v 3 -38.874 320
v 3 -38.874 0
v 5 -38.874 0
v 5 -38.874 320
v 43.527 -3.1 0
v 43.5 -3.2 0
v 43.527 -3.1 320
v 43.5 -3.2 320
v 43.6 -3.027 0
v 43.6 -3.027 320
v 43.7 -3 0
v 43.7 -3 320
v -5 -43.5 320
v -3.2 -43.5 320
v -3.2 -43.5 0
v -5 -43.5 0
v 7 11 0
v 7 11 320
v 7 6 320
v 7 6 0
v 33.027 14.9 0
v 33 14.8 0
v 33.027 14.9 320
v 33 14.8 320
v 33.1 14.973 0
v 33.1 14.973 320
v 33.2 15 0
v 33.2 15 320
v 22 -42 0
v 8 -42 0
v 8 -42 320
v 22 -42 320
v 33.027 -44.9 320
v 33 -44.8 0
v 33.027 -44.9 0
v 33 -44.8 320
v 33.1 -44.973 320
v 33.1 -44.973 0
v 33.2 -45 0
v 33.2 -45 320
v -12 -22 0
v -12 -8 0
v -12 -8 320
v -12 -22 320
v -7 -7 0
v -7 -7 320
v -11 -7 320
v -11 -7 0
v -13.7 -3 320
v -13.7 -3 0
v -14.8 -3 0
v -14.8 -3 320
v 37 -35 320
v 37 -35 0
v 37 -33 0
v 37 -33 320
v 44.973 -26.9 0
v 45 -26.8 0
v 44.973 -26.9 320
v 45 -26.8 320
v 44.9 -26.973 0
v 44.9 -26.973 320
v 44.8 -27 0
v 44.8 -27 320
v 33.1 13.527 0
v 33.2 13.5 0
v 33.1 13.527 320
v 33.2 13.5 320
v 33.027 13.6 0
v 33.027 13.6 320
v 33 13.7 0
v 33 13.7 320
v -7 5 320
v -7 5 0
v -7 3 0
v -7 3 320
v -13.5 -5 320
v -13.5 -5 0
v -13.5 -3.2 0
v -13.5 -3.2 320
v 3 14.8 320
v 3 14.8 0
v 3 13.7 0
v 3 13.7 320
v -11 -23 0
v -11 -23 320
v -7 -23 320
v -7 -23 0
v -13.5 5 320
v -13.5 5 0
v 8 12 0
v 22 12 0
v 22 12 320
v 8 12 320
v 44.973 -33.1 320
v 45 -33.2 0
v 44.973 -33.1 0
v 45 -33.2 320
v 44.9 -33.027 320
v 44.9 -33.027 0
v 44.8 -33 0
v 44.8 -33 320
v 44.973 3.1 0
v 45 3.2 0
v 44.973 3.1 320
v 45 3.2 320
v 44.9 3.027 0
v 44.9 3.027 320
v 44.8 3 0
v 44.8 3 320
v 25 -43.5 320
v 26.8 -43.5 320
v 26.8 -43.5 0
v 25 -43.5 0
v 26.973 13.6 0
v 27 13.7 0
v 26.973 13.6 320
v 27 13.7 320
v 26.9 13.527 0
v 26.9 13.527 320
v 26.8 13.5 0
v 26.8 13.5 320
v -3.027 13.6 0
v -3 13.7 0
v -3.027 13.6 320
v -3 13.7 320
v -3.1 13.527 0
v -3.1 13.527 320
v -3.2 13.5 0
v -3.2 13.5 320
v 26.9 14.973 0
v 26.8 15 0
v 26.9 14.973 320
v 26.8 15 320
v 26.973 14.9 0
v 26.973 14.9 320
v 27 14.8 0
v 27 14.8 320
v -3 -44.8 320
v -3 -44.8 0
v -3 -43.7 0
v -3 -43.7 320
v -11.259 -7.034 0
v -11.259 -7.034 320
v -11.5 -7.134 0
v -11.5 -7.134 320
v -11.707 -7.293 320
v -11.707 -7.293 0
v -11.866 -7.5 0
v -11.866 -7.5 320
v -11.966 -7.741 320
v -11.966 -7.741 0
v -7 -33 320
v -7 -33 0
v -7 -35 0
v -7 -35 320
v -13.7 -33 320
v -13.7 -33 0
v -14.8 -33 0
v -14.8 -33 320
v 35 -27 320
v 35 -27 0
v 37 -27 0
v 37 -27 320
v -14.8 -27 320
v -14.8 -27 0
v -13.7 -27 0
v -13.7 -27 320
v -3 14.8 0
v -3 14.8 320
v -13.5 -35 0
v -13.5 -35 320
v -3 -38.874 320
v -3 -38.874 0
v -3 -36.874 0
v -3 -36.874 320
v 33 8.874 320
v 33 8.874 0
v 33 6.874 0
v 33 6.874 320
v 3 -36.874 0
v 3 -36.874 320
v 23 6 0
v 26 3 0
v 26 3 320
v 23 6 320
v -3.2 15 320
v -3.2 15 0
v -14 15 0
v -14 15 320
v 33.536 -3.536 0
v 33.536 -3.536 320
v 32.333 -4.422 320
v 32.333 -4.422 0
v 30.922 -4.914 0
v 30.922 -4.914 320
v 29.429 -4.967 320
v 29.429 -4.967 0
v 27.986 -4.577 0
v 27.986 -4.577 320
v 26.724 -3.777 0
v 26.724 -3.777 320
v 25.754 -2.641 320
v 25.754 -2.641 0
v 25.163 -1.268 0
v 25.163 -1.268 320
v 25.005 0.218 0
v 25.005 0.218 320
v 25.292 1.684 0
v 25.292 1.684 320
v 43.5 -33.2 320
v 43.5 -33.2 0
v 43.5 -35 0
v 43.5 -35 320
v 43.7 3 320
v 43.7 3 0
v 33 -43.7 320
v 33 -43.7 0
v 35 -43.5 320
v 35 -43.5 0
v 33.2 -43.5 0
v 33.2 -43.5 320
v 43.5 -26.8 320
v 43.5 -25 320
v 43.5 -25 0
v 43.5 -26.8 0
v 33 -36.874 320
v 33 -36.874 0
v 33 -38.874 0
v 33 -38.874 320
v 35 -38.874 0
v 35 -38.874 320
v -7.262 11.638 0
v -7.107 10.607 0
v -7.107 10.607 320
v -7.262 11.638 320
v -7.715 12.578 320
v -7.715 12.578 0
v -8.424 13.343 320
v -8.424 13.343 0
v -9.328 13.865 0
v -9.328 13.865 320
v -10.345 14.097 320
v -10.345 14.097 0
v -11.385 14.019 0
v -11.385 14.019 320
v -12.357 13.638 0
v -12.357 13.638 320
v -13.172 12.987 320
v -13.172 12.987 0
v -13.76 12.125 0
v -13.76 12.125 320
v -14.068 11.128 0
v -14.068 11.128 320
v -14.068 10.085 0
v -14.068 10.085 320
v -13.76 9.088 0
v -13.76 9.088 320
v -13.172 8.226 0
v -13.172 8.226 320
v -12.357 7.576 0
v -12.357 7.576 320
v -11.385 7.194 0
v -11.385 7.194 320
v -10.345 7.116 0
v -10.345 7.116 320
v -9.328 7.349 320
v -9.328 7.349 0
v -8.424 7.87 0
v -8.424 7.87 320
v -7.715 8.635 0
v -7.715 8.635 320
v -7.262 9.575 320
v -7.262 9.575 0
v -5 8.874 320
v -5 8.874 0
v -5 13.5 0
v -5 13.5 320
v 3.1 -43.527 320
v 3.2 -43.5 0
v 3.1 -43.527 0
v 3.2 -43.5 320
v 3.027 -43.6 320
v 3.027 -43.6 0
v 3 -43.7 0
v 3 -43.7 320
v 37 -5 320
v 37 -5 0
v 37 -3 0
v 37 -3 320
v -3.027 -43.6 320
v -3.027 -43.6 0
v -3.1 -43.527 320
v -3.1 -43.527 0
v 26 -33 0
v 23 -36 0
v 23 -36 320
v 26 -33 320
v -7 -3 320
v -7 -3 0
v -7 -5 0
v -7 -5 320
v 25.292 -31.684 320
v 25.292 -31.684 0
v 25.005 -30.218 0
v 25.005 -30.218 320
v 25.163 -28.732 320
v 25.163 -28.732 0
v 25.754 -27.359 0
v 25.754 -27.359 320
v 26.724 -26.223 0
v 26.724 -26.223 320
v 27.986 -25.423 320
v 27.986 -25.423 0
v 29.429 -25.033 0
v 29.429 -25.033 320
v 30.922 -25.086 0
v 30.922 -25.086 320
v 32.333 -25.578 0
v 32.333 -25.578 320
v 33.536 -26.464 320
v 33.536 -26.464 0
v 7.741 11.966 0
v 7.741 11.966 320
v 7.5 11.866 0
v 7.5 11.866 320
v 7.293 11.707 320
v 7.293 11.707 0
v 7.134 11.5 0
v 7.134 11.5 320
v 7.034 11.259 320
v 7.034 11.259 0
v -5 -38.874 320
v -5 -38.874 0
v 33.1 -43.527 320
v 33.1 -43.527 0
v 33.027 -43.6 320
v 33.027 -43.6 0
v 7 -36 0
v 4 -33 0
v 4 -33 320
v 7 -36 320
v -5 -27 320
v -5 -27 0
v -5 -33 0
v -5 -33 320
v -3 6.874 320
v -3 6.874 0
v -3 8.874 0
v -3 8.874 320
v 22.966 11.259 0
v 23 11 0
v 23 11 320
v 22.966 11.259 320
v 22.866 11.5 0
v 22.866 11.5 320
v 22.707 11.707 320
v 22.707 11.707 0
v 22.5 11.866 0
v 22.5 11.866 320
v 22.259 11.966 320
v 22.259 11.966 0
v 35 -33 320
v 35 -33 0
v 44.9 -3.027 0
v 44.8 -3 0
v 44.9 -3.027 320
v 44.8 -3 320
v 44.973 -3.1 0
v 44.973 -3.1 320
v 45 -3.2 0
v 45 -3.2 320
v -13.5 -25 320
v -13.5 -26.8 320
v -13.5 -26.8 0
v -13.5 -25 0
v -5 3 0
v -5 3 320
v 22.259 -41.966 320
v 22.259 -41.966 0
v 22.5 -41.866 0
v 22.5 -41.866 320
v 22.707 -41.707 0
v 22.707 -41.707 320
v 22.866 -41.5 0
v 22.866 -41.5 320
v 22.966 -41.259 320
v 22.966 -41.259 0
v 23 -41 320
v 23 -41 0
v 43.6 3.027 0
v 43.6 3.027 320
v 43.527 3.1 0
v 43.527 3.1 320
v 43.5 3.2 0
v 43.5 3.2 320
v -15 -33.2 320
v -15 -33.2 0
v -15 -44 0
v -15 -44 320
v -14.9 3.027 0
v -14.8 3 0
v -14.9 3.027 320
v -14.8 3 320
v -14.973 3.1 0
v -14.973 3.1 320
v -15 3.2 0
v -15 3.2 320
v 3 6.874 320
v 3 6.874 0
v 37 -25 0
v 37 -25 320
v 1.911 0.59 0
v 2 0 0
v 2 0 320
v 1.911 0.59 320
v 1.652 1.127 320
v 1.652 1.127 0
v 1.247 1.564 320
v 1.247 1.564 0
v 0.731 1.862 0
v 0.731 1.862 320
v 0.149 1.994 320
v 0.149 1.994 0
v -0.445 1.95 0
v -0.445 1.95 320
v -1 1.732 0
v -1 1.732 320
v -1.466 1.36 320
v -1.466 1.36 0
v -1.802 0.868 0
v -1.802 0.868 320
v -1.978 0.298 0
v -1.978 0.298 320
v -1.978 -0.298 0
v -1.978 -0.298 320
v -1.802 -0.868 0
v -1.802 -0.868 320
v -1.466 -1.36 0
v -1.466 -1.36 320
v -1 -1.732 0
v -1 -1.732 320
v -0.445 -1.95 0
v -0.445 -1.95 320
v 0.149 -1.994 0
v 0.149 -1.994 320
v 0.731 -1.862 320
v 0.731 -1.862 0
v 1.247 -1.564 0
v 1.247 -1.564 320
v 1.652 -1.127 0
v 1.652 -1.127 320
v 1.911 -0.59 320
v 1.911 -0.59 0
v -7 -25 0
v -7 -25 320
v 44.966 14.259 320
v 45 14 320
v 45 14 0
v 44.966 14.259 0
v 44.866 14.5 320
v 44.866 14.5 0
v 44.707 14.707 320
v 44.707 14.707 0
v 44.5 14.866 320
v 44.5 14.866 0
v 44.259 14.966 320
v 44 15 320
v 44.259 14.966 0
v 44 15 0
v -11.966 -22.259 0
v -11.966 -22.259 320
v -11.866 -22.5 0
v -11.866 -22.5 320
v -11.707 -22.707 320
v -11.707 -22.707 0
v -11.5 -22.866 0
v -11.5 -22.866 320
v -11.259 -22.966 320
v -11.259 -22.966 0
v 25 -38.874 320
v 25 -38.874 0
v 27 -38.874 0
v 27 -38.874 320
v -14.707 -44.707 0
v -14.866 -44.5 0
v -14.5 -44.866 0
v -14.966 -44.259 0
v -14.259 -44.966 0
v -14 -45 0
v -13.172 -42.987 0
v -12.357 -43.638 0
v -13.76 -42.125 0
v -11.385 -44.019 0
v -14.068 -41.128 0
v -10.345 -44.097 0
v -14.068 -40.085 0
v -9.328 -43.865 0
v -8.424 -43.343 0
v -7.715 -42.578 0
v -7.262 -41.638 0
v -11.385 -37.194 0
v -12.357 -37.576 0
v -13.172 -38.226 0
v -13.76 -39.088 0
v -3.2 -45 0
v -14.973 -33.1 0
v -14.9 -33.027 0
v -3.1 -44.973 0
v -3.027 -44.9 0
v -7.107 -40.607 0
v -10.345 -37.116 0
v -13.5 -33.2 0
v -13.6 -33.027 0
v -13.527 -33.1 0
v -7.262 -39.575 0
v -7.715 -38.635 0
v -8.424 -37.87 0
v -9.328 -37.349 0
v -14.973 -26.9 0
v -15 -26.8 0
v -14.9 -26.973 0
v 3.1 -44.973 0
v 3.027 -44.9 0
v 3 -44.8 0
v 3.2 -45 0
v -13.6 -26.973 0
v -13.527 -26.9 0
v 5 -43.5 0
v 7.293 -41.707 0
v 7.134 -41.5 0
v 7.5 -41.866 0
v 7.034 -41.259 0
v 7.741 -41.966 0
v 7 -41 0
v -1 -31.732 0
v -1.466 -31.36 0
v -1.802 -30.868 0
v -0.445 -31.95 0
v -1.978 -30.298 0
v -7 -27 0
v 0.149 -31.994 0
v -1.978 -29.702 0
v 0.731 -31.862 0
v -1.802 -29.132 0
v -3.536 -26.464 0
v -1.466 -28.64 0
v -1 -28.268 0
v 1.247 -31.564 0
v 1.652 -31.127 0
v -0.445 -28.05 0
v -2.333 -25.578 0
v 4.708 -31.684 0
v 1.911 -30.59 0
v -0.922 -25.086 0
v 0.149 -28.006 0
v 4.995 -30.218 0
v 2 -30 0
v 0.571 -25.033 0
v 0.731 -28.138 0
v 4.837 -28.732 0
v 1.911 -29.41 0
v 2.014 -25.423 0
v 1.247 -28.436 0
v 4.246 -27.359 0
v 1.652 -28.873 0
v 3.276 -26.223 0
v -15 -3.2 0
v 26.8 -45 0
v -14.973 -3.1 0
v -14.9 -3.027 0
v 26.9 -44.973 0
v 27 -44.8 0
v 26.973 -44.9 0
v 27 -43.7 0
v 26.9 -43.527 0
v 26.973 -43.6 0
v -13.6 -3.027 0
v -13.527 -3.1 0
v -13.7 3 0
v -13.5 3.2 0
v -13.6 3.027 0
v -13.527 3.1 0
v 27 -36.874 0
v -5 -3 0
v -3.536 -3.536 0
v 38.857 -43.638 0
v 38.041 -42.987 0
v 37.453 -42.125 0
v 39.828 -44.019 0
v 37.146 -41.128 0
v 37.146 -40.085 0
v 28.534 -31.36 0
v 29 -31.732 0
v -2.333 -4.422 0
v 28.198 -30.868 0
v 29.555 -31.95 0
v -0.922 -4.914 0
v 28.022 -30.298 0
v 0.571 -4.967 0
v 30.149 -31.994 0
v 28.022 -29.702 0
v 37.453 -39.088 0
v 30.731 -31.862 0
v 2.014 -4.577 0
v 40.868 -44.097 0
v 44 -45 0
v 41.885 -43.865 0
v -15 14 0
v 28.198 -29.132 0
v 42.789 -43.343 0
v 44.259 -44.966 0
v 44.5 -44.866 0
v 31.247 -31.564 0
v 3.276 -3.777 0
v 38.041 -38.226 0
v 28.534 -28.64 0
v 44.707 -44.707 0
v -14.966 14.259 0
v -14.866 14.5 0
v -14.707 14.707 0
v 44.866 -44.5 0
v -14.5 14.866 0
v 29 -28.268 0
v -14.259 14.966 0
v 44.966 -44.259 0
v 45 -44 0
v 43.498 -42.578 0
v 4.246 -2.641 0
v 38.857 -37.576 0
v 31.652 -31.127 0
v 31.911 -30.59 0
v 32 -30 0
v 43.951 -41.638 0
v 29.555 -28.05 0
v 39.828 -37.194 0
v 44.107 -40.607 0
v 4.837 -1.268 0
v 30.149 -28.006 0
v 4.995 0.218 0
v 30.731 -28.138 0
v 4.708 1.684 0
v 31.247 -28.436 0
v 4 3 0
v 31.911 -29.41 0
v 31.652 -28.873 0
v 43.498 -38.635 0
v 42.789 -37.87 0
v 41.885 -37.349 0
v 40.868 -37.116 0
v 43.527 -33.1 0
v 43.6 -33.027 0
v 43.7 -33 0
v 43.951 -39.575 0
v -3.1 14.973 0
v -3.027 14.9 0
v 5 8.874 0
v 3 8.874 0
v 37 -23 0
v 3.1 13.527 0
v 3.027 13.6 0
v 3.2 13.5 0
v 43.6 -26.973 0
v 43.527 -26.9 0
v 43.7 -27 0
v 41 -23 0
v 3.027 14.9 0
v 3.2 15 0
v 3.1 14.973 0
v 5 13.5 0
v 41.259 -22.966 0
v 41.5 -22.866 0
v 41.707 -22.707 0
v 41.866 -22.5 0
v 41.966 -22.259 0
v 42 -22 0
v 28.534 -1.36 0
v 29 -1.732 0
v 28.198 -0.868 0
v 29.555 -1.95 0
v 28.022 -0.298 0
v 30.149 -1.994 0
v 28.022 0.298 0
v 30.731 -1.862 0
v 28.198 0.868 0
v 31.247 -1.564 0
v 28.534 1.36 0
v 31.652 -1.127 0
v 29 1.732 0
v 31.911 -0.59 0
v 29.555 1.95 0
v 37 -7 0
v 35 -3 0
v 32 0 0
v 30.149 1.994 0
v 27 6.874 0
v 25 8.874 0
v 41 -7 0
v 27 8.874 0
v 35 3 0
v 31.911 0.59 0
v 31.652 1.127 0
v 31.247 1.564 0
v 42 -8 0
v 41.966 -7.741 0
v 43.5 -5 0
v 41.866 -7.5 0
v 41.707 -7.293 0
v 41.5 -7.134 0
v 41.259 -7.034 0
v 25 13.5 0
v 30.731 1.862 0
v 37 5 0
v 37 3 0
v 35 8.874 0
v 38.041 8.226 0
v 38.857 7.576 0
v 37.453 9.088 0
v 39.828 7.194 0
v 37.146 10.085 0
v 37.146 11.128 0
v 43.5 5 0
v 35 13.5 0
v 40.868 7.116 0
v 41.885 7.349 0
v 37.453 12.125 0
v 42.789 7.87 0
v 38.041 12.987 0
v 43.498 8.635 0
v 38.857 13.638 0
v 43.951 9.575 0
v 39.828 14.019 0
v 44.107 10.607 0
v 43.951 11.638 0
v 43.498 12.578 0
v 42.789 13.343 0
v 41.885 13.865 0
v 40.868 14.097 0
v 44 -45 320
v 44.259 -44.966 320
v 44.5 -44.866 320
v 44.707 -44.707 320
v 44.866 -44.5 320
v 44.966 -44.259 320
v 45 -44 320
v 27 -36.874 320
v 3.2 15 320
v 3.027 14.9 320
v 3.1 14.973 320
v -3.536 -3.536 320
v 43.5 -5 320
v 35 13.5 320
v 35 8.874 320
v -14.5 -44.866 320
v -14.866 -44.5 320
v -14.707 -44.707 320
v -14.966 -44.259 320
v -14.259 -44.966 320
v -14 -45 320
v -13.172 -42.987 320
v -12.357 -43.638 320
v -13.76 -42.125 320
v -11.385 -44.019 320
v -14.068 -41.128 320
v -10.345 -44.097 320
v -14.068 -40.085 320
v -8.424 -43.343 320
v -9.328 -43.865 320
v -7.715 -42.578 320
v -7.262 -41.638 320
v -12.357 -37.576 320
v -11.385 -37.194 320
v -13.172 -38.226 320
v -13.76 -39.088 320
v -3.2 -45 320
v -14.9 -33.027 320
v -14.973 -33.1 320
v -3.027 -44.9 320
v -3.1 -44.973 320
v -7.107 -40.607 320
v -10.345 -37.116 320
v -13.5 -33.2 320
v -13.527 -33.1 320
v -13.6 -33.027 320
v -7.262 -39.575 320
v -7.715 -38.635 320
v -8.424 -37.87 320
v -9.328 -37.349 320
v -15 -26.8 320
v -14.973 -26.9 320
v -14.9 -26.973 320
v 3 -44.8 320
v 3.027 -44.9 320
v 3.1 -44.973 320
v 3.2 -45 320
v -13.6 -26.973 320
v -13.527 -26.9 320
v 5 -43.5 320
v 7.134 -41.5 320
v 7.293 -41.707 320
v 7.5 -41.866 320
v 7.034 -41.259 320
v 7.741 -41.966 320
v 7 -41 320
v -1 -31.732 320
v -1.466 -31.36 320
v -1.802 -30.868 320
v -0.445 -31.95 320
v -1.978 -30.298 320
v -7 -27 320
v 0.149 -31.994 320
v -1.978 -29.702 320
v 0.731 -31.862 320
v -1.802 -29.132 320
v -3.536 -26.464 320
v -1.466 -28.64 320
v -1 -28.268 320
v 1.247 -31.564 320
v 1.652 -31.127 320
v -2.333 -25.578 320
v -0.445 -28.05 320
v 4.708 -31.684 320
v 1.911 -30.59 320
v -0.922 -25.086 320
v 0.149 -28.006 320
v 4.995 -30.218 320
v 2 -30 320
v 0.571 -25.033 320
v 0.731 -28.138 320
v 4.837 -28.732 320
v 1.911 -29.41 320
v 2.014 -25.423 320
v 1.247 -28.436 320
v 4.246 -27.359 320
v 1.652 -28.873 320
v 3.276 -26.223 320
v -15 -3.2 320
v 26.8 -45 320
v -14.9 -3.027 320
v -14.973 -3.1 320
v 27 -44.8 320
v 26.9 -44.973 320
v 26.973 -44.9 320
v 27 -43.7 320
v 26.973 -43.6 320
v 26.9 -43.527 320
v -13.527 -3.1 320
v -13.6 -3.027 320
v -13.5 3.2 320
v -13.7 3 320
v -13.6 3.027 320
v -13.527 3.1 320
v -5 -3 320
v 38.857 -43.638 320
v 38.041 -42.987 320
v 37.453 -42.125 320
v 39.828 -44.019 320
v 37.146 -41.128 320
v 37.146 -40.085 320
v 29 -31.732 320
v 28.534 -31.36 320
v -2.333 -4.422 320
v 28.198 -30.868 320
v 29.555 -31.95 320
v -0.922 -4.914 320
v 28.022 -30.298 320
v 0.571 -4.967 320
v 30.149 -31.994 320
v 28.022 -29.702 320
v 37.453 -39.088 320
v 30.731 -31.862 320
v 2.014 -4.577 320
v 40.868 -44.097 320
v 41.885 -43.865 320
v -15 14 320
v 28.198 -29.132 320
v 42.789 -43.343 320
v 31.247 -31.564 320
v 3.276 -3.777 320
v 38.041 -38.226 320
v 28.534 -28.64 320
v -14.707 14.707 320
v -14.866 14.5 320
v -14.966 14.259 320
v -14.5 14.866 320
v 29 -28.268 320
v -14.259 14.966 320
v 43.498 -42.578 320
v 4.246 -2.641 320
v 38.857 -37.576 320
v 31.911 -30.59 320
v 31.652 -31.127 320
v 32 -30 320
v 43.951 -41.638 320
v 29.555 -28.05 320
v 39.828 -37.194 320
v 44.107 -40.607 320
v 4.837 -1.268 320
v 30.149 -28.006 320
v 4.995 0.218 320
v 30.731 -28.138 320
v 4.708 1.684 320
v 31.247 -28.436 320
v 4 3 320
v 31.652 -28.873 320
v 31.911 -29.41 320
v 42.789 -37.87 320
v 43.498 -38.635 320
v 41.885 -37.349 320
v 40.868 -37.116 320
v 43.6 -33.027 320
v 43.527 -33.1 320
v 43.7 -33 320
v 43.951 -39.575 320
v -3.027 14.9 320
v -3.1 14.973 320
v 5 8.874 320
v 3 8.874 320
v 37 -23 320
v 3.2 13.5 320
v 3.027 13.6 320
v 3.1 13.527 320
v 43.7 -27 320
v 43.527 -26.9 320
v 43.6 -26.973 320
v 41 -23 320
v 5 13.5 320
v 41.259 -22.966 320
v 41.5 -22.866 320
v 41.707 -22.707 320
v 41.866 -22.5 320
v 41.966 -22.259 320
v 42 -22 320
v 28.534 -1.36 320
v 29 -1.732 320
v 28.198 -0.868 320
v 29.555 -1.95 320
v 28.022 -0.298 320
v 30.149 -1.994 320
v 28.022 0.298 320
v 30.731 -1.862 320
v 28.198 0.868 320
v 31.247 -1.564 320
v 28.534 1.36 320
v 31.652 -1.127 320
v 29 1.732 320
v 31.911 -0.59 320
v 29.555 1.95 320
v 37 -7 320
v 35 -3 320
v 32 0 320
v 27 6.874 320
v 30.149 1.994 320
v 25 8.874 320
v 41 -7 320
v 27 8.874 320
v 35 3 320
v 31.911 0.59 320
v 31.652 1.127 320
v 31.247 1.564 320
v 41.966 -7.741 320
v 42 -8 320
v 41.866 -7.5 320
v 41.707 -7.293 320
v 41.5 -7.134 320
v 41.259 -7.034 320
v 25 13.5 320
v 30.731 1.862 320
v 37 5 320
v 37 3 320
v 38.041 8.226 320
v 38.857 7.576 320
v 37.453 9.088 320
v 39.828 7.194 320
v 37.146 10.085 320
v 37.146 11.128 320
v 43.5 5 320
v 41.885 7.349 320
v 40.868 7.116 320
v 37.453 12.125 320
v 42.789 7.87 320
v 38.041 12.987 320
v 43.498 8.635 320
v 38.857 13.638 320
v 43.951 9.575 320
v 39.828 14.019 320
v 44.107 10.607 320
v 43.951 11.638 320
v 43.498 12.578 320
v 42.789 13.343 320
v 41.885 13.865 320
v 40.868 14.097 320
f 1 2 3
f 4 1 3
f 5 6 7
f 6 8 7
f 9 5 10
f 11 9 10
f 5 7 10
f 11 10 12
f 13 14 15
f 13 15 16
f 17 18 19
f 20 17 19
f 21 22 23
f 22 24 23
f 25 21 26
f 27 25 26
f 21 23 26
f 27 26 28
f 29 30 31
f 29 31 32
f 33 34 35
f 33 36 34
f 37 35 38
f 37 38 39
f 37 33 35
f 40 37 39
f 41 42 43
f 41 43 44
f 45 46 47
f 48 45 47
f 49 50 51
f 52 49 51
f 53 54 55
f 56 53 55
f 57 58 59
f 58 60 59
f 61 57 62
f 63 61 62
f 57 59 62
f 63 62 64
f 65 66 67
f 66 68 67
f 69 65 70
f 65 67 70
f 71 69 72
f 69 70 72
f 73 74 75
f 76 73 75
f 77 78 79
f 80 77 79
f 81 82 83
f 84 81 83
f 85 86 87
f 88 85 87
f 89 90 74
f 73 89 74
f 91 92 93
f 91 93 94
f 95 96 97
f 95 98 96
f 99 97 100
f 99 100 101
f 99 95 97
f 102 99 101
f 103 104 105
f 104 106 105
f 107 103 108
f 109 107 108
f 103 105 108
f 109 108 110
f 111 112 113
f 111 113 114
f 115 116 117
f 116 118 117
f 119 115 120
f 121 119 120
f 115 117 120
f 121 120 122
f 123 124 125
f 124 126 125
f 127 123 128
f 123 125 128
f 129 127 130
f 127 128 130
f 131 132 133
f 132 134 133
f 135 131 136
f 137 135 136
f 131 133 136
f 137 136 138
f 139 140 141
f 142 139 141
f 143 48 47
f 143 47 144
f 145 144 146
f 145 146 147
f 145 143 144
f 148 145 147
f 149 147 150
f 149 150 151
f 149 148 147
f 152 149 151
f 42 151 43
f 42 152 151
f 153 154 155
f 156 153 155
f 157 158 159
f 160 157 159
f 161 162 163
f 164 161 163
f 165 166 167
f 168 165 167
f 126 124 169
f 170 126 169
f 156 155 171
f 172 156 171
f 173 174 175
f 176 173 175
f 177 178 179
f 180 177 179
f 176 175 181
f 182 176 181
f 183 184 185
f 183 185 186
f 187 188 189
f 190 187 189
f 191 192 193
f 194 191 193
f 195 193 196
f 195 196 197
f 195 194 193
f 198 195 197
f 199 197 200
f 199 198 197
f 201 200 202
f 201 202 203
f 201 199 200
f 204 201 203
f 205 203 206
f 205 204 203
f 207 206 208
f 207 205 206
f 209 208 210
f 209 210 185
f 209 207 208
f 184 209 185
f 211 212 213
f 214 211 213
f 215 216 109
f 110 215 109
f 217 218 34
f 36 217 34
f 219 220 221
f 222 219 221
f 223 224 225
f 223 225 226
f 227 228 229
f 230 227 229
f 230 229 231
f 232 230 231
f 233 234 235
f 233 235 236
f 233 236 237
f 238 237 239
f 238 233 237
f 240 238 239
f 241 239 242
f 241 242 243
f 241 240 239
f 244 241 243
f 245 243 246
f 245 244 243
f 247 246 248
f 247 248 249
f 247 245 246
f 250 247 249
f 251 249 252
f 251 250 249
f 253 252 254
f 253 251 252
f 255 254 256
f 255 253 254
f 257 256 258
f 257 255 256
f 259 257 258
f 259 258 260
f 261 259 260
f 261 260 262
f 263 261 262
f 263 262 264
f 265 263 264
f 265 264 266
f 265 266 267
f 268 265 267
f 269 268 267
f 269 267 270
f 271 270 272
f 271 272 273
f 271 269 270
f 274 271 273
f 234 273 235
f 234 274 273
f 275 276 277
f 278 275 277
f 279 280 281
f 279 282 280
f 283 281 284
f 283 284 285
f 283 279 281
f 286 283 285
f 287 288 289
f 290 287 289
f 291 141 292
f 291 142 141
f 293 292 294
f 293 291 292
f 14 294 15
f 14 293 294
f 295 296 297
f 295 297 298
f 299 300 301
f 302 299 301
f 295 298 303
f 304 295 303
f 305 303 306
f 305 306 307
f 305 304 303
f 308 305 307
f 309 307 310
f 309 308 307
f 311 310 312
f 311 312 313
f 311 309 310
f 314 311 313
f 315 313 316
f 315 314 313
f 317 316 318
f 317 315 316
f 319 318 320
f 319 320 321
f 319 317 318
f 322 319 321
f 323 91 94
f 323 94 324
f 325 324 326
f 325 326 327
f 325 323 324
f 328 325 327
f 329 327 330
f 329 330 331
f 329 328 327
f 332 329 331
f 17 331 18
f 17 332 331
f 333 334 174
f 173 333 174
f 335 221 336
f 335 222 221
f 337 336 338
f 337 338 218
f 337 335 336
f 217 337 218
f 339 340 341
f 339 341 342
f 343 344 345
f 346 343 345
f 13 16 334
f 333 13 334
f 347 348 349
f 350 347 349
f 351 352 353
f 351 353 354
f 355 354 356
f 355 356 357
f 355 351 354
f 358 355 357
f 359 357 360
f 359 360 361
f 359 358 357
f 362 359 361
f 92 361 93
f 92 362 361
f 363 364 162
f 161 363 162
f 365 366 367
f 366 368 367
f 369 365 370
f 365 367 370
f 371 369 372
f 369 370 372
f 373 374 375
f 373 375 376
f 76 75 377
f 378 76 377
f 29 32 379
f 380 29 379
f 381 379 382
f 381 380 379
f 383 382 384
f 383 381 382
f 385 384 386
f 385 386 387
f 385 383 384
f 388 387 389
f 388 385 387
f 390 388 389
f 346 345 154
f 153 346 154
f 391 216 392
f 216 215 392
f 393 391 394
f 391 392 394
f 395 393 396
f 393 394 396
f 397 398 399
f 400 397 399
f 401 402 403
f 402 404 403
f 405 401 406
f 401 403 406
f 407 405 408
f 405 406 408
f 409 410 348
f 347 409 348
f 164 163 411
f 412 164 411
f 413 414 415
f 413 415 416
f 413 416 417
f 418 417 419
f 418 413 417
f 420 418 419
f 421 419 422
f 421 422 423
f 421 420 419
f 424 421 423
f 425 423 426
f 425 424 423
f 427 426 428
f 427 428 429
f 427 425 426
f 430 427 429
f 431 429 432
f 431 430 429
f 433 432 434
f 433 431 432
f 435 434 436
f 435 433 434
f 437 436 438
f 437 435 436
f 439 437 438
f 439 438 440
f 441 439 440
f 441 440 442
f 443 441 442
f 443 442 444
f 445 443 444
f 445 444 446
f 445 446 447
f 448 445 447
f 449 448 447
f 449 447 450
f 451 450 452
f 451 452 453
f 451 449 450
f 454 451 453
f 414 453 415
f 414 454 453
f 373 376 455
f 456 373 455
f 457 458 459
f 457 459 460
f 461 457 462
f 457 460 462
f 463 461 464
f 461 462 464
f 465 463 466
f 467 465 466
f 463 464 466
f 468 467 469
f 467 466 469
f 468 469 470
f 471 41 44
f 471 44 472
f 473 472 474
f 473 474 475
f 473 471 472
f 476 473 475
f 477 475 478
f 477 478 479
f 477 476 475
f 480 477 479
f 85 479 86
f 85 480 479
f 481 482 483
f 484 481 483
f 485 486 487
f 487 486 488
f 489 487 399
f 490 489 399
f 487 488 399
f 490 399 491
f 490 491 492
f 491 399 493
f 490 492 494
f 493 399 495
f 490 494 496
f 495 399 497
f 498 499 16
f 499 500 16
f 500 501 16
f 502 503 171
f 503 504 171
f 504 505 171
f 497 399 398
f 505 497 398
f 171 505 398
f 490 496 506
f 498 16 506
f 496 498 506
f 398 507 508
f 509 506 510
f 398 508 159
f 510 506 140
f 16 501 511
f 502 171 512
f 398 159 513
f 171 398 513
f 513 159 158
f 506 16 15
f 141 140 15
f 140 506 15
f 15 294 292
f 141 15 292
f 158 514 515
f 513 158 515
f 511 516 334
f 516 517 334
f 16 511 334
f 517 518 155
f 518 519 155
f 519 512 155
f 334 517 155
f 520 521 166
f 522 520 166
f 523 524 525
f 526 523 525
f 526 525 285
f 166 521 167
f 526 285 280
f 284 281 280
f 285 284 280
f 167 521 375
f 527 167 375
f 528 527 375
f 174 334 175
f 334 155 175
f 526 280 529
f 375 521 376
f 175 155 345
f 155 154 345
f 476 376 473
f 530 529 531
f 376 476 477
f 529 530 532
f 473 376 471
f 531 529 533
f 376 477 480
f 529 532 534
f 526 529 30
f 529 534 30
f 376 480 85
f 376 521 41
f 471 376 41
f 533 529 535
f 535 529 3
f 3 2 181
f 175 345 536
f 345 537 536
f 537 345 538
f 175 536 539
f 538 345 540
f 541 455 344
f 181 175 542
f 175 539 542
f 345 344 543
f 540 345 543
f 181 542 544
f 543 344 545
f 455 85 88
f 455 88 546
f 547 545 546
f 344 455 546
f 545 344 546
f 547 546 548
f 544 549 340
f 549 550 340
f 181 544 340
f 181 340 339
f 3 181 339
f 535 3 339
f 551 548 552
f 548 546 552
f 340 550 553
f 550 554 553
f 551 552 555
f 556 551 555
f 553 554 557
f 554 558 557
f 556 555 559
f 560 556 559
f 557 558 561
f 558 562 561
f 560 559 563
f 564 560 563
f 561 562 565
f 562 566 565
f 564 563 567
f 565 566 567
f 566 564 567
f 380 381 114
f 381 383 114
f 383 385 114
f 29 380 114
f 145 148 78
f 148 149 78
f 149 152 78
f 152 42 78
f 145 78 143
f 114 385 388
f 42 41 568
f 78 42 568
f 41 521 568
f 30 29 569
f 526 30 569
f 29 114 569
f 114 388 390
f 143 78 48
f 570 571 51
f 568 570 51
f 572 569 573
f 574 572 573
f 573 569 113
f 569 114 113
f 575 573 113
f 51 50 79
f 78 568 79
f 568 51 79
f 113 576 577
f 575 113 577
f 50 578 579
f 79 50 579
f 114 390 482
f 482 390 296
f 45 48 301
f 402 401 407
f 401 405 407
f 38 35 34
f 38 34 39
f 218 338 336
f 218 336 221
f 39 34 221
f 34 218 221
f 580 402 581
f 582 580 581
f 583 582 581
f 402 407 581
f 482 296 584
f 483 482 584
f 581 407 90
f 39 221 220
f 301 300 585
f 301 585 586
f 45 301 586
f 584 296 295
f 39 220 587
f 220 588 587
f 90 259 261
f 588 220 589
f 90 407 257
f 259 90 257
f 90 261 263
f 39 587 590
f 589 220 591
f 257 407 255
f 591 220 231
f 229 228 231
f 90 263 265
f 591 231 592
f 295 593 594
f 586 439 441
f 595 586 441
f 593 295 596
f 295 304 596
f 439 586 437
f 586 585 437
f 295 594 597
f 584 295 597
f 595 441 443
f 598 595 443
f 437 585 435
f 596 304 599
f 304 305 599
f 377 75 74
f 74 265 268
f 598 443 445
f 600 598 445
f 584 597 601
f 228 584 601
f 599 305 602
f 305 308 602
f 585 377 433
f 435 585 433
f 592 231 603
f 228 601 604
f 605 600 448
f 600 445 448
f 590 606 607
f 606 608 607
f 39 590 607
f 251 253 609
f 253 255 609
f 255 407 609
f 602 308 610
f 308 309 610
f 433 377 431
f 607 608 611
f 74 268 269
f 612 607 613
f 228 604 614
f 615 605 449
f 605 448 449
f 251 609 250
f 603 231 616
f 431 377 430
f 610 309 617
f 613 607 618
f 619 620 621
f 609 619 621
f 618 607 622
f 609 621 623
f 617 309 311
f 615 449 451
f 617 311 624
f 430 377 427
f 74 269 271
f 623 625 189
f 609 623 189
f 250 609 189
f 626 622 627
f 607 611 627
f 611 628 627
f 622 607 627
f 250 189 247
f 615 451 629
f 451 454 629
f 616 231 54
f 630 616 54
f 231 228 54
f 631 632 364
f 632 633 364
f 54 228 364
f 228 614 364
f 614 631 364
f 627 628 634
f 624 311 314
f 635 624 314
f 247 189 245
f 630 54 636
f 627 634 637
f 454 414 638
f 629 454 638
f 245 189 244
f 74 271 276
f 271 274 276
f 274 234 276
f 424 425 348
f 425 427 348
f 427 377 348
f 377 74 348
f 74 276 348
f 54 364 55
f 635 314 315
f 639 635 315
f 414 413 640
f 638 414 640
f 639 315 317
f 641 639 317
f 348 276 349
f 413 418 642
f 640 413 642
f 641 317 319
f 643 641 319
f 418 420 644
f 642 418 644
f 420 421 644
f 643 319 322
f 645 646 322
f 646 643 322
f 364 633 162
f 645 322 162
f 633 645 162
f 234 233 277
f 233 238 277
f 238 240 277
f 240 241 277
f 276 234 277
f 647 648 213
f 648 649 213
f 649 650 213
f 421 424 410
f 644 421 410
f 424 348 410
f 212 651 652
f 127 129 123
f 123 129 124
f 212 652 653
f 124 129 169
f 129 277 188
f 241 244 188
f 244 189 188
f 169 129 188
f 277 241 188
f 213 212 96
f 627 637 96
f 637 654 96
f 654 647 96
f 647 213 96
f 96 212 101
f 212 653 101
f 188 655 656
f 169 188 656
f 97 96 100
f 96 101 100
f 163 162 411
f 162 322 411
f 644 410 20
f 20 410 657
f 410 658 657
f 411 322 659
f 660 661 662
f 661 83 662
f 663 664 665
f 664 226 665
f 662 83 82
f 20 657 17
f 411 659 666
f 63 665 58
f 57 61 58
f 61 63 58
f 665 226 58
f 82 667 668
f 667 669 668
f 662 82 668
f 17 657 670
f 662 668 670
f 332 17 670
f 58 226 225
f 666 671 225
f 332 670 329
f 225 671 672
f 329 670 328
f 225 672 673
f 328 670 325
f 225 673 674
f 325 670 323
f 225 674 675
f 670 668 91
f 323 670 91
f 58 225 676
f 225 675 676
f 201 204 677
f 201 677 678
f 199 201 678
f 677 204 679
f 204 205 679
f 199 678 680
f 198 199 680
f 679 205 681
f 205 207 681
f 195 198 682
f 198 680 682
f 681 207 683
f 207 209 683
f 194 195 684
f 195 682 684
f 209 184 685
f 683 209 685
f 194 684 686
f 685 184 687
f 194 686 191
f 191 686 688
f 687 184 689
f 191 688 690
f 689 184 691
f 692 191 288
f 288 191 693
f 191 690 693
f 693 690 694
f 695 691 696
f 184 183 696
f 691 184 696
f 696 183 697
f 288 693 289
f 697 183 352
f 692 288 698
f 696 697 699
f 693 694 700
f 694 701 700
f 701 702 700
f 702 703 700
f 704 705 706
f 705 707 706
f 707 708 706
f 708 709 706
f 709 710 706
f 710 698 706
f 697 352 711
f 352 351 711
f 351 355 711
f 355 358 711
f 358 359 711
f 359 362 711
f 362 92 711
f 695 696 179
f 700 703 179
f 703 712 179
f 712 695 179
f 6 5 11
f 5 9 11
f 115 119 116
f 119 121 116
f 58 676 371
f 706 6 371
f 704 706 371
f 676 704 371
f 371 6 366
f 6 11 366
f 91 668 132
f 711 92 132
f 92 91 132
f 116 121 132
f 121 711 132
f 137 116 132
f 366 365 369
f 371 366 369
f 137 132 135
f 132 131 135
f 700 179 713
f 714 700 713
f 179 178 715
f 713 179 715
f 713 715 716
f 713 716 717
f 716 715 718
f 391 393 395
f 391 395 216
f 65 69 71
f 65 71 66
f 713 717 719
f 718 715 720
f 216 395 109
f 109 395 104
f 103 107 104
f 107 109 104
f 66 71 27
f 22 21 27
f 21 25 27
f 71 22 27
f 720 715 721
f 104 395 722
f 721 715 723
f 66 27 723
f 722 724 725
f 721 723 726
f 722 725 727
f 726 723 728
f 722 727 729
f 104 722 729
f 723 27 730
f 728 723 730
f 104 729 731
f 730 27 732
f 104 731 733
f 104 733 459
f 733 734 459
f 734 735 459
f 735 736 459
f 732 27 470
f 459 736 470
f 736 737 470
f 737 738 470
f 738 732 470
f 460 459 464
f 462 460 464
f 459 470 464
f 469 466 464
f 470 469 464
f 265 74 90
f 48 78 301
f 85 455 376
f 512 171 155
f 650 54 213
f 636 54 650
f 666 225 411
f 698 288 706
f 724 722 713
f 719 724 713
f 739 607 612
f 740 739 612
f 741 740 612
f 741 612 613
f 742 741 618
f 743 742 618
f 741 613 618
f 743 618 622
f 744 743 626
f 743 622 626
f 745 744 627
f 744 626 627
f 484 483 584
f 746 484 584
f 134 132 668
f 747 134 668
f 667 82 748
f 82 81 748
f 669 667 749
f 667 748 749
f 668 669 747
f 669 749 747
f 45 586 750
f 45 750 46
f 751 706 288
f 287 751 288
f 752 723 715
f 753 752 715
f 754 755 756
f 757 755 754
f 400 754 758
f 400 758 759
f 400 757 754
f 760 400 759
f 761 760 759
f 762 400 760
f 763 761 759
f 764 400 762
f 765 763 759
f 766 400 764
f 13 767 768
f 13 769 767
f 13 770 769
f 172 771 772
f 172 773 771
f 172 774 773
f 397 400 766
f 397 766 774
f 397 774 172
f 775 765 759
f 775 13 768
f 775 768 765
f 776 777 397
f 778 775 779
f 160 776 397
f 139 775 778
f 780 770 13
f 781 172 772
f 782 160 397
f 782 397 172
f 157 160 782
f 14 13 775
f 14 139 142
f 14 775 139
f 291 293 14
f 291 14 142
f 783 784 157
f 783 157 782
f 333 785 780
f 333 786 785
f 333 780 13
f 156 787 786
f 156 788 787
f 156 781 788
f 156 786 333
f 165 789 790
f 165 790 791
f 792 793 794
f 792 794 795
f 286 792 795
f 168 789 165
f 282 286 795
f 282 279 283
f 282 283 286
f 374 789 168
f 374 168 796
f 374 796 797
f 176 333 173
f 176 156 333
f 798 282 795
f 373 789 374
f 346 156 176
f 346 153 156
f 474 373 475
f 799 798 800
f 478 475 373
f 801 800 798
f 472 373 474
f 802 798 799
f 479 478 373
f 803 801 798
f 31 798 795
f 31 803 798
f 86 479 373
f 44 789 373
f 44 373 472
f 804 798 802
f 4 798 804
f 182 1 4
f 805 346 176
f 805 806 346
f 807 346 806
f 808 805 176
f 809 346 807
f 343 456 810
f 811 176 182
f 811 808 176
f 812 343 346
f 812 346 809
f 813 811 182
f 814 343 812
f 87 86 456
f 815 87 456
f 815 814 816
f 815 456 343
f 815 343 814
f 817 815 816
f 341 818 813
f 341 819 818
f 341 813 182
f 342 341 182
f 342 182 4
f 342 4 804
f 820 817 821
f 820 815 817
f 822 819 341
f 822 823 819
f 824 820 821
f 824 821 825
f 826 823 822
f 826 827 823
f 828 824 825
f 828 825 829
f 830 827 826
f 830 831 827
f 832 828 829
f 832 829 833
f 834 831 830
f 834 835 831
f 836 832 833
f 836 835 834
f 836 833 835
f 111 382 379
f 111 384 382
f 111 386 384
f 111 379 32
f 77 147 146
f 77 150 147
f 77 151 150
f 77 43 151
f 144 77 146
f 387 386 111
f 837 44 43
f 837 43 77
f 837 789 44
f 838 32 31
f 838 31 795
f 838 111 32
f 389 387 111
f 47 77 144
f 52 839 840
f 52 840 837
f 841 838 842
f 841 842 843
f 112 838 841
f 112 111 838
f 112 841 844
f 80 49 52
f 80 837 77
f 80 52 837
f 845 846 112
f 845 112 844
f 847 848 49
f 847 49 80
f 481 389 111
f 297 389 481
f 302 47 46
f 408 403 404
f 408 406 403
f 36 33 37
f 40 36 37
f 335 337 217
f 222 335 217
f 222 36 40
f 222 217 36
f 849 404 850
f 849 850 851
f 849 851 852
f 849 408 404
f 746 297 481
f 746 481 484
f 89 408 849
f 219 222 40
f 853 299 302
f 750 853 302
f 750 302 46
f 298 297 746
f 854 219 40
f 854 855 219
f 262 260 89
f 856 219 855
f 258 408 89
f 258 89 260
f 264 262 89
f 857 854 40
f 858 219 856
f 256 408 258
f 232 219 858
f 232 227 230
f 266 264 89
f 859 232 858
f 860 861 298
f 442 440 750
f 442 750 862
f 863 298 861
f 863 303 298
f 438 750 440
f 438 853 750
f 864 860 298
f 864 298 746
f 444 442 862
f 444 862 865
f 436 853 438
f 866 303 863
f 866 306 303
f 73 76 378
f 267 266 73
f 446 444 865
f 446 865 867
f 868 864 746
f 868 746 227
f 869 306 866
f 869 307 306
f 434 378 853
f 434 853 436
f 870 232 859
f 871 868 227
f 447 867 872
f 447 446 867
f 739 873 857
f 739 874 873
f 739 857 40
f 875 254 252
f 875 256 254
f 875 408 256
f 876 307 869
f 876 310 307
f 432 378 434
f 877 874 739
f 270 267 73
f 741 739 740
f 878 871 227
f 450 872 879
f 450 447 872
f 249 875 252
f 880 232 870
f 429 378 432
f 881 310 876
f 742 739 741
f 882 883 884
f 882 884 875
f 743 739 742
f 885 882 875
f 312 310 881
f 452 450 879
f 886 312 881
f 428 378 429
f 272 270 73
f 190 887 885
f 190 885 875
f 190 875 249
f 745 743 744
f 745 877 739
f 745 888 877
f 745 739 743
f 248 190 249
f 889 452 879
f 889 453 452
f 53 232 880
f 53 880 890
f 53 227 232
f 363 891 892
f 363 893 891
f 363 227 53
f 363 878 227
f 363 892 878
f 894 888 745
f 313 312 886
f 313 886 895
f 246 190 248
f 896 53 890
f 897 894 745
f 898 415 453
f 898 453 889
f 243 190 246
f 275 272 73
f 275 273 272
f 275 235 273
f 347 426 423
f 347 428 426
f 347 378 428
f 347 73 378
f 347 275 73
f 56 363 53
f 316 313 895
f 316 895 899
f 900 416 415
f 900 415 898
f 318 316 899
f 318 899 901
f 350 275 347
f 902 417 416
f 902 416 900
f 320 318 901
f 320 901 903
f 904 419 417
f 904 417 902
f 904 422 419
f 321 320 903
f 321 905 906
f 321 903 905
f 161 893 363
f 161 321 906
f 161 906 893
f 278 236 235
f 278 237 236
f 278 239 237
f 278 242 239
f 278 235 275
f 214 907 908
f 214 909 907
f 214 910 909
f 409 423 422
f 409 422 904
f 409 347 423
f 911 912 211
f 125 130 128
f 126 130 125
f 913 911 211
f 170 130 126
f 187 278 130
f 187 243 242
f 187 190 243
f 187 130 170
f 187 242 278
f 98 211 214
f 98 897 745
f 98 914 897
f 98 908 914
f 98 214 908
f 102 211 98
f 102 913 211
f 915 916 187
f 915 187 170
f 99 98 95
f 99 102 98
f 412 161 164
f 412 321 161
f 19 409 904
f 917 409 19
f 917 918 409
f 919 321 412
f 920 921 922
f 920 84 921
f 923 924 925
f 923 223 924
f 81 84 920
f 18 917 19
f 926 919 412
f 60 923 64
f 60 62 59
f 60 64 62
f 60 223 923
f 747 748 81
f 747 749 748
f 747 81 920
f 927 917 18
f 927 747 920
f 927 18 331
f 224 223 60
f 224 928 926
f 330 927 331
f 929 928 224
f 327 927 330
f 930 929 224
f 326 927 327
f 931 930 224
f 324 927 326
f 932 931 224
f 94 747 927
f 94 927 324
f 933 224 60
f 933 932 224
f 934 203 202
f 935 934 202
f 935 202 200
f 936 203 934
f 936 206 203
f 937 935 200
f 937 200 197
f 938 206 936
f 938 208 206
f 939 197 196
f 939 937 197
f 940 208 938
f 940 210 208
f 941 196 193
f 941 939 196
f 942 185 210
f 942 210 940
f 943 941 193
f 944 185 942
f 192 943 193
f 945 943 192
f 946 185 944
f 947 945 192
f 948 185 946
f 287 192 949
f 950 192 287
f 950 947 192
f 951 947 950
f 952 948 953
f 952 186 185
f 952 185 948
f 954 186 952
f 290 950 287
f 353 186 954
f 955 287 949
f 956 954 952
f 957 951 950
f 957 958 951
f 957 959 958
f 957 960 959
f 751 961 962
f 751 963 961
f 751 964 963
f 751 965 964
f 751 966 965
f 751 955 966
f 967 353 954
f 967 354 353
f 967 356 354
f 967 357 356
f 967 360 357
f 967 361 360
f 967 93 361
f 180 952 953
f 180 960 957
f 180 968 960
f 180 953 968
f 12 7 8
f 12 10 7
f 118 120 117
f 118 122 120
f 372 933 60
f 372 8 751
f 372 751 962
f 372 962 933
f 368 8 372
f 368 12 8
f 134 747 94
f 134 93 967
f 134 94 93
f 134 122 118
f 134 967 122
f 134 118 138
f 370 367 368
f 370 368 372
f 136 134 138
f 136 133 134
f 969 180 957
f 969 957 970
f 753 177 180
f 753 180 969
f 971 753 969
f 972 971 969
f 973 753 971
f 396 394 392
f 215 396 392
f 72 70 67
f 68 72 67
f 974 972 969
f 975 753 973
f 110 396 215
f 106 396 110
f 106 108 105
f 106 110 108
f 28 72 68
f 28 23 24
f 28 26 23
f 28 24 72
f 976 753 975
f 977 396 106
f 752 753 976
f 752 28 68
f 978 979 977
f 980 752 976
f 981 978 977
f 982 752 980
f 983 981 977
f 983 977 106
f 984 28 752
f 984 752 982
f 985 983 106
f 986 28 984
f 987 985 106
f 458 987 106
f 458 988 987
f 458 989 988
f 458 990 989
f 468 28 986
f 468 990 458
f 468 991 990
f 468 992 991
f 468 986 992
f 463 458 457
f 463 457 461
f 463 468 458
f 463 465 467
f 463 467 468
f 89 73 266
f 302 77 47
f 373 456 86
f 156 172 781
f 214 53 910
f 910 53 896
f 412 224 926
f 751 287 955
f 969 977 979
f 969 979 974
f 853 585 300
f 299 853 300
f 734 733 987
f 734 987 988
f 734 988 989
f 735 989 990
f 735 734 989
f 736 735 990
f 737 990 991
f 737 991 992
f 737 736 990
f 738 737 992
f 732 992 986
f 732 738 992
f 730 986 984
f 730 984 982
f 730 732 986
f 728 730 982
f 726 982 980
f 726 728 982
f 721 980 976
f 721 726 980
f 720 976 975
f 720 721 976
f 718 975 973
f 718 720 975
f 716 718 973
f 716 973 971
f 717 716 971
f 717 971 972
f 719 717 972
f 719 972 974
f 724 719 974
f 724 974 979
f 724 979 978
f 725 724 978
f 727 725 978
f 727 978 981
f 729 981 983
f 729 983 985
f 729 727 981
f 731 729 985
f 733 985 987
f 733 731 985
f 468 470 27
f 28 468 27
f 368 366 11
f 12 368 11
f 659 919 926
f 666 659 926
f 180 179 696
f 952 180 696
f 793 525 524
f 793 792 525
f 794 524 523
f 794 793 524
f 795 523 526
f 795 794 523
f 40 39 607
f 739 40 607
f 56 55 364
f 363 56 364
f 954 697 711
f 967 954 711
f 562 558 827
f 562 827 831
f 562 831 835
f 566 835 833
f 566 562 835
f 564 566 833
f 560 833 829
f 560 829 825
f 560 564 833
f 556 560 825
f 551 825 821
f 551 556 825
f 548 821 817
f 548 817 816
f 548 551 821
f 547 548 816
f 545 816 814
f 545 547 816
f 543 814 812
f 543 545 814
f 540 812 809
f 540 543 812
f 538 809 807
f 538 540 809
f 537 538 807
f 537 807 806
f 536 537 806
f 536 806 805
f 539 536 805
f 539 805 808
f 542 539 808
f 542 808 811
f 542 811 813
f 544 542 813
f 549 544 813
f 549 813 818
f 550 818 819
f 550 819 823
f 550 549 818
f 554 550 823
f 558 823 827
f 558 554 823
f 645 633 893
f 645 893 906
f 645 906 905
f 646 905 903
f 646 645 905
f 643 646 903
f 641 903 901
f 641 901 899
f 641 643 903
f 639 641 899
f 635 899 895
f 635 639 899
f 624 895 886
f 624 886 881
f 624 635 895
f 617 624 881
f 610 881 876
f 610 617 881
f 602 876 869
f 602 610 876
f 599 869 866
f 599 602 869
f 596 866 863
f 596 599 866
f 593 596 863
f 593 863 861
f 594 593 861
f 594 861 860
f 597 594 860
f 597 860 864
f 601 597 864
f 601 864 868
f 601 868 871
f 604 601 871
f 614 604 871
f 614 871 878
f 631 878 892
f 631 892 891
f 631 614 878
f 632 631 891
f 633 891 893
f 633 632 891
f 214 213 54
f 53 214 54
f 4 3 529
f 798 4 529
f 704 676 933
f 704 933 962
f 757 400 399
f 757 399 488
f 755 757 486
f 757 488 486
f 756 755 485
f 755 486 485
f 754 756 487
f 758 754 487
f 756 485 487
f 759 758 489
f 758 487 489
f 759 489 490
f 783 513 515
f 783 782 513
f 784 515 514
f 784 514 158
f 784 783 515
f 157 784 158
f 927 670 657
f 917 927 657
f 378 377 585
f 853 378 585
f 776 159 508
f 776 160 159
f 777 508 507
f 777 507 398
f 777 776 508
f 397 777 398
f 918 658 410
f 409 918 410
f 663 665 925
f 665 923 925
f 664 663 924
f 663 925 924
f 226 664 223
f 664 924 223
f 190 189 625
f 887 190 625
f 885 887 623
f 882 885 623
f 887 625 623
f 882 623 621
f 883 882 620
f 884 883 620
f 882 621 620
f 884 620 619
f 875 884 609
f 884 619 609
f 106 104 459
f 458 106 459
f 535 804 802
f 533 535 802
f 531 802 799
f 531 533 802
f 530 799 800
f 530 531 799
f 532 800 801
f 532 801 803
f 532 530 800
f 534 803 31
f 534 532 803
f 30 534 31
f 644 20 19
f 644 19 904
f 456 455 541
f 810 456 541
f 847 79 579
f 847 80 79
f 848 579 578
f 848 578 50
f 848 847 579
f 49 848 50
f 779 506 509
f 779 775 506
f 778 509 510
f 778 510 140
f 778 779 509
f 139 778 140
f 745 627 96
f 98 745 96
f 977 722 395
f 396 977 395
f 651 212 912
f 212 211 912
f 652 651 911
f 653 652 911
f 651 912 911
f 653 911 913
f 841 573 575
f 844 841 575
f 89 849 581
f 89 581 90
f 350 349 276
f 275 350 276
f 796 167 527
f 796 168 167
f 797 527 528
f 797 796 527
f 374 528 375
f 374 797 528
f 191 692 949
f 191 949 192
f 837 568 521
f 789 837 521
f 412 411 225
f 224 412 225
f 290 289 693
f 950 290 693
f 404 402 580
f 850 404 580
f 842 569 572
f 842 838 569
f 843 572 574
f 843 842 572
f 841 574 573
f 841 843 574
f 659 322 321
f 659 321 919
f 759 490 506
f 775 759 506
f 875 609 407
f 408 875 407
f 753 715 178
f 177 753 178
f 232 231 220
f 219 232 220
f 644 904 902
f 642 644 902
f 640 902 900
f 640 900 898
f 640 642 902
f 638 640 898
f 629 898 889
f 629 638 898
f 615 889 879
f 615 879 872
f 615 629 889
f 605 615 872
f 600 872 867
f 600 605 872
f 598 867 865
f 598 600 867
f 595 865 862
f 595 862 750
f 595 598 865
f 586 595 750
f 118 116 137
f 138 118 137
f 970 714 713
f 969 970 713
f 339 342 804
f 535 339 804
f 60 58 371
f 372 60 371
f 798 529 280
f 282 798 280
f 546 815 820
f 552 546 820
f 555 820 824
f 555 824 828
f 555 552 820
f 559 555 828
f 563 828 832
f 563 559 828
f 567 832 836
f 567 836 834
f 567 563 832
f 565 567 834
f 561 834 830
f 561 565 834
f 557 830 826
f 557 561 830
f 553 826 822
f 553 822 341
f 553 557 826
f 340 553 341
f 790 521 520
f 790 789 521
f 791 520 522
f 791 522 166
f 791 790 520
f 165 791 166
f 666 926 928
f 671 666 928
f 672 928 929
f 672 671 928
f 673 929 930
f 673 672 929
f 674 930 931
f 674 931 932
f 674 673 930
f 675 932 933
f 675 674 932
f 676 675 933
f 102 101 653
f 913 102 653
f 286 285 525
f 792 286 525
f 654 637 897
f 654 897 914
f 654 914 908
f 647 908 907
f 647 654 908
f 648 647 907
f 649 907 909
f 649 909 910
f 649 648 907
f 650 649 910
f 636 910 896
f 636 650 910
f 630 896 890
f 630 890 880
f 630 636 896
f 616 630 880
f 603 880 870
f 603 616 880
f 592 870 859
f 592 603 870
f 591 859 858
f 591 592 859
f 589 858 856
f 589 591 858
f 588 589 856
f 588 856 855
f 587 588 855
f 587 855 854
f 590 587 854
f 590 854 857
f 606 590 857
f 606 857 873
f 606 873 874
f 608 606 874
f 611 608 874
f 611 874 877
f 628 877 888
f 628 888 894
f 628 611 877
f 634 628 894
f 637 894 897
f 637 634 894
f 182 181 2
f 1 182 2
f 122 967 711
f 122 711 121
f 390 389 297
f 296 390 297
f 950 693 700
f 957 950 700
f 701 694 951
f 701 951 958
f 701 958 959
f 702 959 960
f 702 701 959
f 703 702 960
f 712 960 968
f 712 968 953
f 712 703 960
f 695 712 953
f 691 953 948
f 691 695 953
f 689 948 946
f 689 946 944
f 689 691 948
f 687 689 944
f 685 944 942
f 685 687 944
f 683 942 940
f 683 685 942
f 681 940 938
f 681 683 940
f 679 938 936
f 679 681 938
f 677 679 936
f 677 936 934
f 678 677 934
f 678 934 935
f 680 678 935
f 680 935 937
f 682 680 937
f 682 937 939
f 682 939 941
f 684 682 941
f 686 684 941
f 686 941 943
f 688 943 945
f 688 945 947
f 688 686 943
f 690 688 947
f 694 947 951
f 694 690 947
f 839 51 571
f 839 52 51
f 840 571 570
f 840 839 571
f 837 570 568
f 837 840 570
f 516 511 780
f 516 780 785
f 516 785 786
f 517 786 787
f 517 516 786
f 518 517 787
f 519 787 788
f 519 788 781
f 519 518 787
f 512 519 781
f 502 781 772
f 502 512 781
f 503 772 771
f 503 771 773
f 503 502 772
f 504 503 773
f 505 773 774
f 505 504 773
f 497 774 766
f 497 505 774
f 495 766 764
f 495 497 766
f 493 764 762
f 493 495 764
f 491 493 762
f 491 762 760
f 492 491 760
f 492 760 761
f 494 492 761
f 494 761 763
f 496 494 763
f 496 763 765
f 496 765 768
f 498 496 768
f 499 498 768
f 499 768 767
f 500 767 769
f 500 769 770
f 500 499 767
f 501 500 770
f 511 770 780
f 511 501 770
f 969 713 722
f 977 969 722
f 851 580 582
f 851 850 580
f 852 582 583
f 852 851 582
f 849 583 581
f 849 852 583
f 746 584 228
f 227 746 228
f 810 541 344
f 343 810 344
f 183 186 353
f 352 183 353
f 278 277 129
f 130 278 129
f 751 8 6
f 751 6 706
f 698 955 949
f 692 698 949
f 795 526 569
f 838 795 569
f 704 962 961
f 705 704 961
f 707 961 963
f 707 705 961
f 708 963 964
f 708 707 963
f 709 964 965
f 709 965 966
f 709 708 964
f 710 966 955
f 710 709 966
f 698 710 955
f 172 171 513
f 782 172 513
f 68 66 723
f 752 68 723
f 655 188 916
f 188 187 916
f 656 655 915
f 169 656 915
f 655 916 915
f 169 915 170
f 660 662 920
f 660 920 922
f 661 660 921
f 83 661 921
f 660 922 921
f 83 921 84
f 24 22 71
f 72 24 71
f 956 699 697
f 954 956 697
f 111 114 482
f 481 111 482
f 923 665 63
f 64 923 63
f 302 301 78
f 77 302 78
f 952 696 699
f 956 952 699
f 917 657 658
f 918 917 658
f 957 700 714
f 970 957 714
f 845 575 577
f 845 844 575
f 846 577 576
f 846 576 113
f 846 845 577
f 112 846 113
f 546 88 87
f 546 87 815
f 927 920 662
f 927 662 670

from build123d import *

# Parameters (mm, degrees)
SKETCH1_R           = 2
SKETCH1_R_2         = 3.5
BOSS_EXTRUDE1_DEPTH = 320
FILLET1_R           = 0.2
FILLET2_R           = 0.2


with BuildPart() as part:
    # Sketch1 → Boss-Extrude1 (new body)
    with BuildSketch(Plane.XY):
        with BuildLine():
            Line((-5, 3), (-5, -3))
            Line((-5, -3), (-7, -3))
            Line((-7, -3), (-7, -5))
            Line((-7, -5), (-13.5, -5))
            Line((-13.5, -5), (-13.5, -3))
            Line((-13.5, -3), (-15, -3))
            Line((-15, -3), (-15, -27))
            Line((-15, -27), (-13.5, -27))
            Line((-13.5, -27), (-13.5, -25))
            Line((-13.5, -25), (-7, -25))
            Line((-7, -25), (-7, -27))
            Line((-7, -27), (-5, -27))
            Line((-5, -27), (-5, -33))
            Line((-5, -33), (-7, -33))
            Line((-7, -33), (-7, -35))
            Line((-7, -35), (-13.5, -35))
            Line((-13.5, -35), (-13.5, -33))
            Line((-13.5, -33), (-15, -33))
            Line((-15, -33), (-15, -44))
            ThreePointArc((-15, -44), (-14.707106781, -44.707106781), (-14, -45))
            Line((-14, -45), (-3, -45))
            Line((-3, -45), (-3, -43.5))
            Line((-3, -43.5), (-5, -43.5))
            Line((-5, -43.5), (-5, -38.87437693))
            Line((-5, -38.87437693), (-3, -38.87437693))
            Line((-3, -38.87437693), (-3, -36.87437693))
            Line((-3, -36.87437693), (3, -36.87437693))
            Line((3, -36.87437693), (3, -38.87437693))
            Line((3, -38.87437693), (5, -38.87437693))
            Line((5, -38.87437693), (5, -43.5))
            Line((5, -43.5), (3, -43.5))
            Line((3, -43.5), (3, -45))
            Line((3, -45), (27, -45))
            Line((27, -45), (27, -43.5))
            Line((27, -43.5), (25, -43.5))
            Line((25, -43.5), (25, -38.87437693))
            Line((25, -38.87437693), (27, -38.87437693))
            Line((27, -38.87437693), (27, -36.87437693))
            Line((27, -36.87437693), (33, -36.87437693))
            Line((33, -36.87437693), (33, -38.87437693))
            Line((33, -38.87437693), (35, -38.87437693))
            Line((35, -38.87437693), (35, -43.5))
            Line((35, -43.5), (33, -43.5))
            Line((33, -43.5), (33, -45))
            Line((33, -45), (44, -45))
            ThreePointArc((44, -45), (44.707106781, -44.707106781), (45, -44))
            Line((45, -44), (45, -33))
            Line((45, -33), (43.5, -33))
            Line((43.5, -33), (43.5, -35))
            Line((43.5, -35), (37, -35))
            Line((37, -35), (37, -33))
            Line((37, -33), (35, -33))
            Line((35, -33), (35, -27))
            Line((35, -27), (37, -27))
            Line((37, -27), (37, -25))
            Line((37, -25), (43.5, -25))
            Line((43.5, -25), (43.5, -27))
            Line((43.5, -27), (45, -27))
            Line((45, -27), (45, -3))
            Line((45, -3), (43.5, -3))
            Line((43.5, -3), (43.5, -5))
            Line((43.5, -5), (37, -5))
            Line((37, -5), (37, -3))
            Line((37, -3), (35, -3))
            Line((35, -3), (35, 3))
            Line((35, 3), (37, 3))
            Line((37, 3), (37, 5))
            Line((37, 5), (43.5, 5))
            Line((43.5, 5), (43.5, 3))
            Line((43.5, 3), (45, 3))
            Line((45, 3), (45, 14))
            ThreePointArc((45, 14), (44.707106781, 14.707106781), (44, 15))
            Line((44, 15), (33, 15))
            Line((33, 15), (33, 13.5))
            Line((33, 13.5), (35, 13.5))
            Line((35, 13.5), (35, 8.87437693))
            Line((35, 8.87437693), (33, 8.87437693))
            Line((33, 8.87437693), (33, 6.87437693))
            Line((33, 6.87437693), (27, 6.87437693))
            Line((27, 6.87437693), (27, 8.87437693))
            Line((27, 8.87437693), (25, 8.87437693))
            Line((25, 8.87437693), (25, 13.5))
            Line((25, 13.5), (27, 13.5))
            Line((27, 13.5), (27, 15))
            Line((27, 15), (3, 15))
            Line((3, 15), (3, 13.5))
            Line((3, 13.5), (5, 13.5))
            Line((5, 13.5), (5, 8.87437693))
            Line((5, 8.87437693), (3, 8.87437693))
            Line((3, 8.87437693), (3, 6.87437693))
            Line((3, 6.87437693), (-3, 6.87437693))
            Line((-3, 6.87437693), (-3, 8.87437693))
            Line((-3, 8.87437693), (-5, 8.87437693))
            Line((-5, 8.87437693), (-5, 13.5))
            Line((-5, 13.5), (-3, 13.5))
            Line((-3, 13.5), (-3, 15))
            Line((-3, 15), (-14, 15))
            ThreePointArc((-14, 15), (-14.707106781, 14.707106781), (-15, 14))
            Line((-15, 14), (-15, 3))
            Line((-15, 3), (-13.5, 3))
            Line((-13.5, 3), (-13.5, 5))
            Line((-13.5, 5), (-7, 5))
            Line((-7, 5), (-7, 3))
            Line((-7, 3), (-5, 3))
        make_face()
        Circle(SKETCH1_R, mode=Mode.SUBTRACT)
        with Locations((-10.606601718, 10.606601718)):
            Circle(SKETCH1_R_2, mode=Mode.SUBTRACT)
        with Locations((-10.606601718, -40.606601718)):
            Circle(SKETCH1_R_2, mode=Mode.SUBTRACT)
        with Locations((0, -30)):
            Circle(SKETCH1_R, mode=Mode.SUBTRACT)
        with Locations((40.606601718, 10.606601718)):
            Circle(SKETCH1_R_2, mode=Mode.SUBTRACT)
        with Locations((30, 0)):
            Circle(SKETCH1_R, mode=Mode.SUBTRACT)
        with Locations((30, -30)):
            Circle(SKETCH1_R, mode=Mode.SUBTRACT)
        with Locations((40.606601718, -40.606601718)):
            Circle(SKETCH1_R_2, mode=Mode.SUBTRACT)
        with BuildLine():
            Line((7, 6), (4, 3))
            ThreePointArc((4, 3), (3.276008707, -3.777269775), (-3.535533906, -3.535533906))
            Line((-3.535533906, -3.535533906), (-7, -7))
            Line((-7, -7), (-11, -7))
            ThreePointArc((-11, -7), (-11.707106781, -7.292893219), (-12, -8))
            Line((-12, -8), (-12, -22))
            ThreePointArc((-12, -22), (-11.707106781, -22.707106781), (-11, -23))
            Line((-11, -23), (-7, -23))
            Line((-7, -23), (-3.535533906, -26.464466094))
            ThreePointArc((-3.535533906, -26.464466094), (3.276008707, -26.222730225), (4, -33))
            Line((4, -33), (7, -36))
            Line((7, -36), (7, -41))
            ThreePointArc((7, -41), (7.292893219, -41.707106781), (8, -42))
            Line((8, -42), (22, -42))
            ThreePointArc((22, -42), (22.707106781, -41.707106781), (23, -41))
            Line((23, -41), (23, -36))
            Line((23, -36), (26, -33))
            ThreePointArc((26, -33), (26.723991293, -26.222730225), (33.535533906, -26.464466094))
            Line((33.535533906, -26.464466094), (37, -23))
            Line((37, -23), (41, -23))
            ThreePointArc((41, -23), (41.707106781, -22.707106781), (42, -22))
            Line((42, -22), (42, -8))
            ThreePointArc((42, -8), (41.707106781, -7.292893219), (41, -7))
            Line((41, -7), (37, -7))
            Line((37, -7), (33.535533906, -3.535533906))
            ThreePointArc((33.535533906, -3.535533906), (26.723991293, -3.777269775), (26, 3))
            Line((26, 3), (23, 6))
            Line((23, 6), (23, 11))
            ThreePointArc((23, 11), (22.707106781, 11.707106781), (22, 12))
            Line((22, 12), (8, 12))
            ThreePointArc((8, 12), (7.292893219, 11.707106781), (7, 11))
            Line((7, 11), (7, 6))
        make_face(mode=Mode.SUBTRACT)
    extrude(amount=BOSS_EXTRUDE1_DEPTH)

    # Fillet1
    fillet1_edges = [part.edges().sort_by_distance(p)[0] for p in [
        (-15, 3, 160),
        (-3, 15, 160),
        (3, 15, 160),
        (27, 15, 160),
        (33, 15, 160),
        (45, 3, 160),
        (45, -3, 160),
        (45, -27, 160),
        (45, -33, 160),
        (33, -45, 160),
        (27, -45, 160),
        (3, -45, 160),
        (-3, -45, 160),
        (-15, -33, 160),
        (-15, -27, 160),
        (-15, -3, 160),
    ]]
    fillet(fillet1_edges, radius=FILLET1_R)

    # Fillet2
    fillet2_edges = [part.edges().sort_by_distance(p)[0] for p in [
        (-13.5, 3, 160),
        (-3, 13.5, 160),
        (3, 13.5, 160),
        (27, 13.5, 160),
        (33, 13.5, 160),
        (43.5, 3, 160),
        (43.5, -3, 160),
        (43.5, -27, 160),
        (43.5, -33, 160),
        (33, -43.5, 160),
        (27, -43.5, 160),
        (3, -43.5, 160),
        (-3, -43.5, 160),
        (-13.5, -33, 160),
        (-13.5, -27, 160),
        (-13.5, -3, 160),
    ]]
    fillet(fillet2_edges, radius=FILLET2_R)


solid = part.part
